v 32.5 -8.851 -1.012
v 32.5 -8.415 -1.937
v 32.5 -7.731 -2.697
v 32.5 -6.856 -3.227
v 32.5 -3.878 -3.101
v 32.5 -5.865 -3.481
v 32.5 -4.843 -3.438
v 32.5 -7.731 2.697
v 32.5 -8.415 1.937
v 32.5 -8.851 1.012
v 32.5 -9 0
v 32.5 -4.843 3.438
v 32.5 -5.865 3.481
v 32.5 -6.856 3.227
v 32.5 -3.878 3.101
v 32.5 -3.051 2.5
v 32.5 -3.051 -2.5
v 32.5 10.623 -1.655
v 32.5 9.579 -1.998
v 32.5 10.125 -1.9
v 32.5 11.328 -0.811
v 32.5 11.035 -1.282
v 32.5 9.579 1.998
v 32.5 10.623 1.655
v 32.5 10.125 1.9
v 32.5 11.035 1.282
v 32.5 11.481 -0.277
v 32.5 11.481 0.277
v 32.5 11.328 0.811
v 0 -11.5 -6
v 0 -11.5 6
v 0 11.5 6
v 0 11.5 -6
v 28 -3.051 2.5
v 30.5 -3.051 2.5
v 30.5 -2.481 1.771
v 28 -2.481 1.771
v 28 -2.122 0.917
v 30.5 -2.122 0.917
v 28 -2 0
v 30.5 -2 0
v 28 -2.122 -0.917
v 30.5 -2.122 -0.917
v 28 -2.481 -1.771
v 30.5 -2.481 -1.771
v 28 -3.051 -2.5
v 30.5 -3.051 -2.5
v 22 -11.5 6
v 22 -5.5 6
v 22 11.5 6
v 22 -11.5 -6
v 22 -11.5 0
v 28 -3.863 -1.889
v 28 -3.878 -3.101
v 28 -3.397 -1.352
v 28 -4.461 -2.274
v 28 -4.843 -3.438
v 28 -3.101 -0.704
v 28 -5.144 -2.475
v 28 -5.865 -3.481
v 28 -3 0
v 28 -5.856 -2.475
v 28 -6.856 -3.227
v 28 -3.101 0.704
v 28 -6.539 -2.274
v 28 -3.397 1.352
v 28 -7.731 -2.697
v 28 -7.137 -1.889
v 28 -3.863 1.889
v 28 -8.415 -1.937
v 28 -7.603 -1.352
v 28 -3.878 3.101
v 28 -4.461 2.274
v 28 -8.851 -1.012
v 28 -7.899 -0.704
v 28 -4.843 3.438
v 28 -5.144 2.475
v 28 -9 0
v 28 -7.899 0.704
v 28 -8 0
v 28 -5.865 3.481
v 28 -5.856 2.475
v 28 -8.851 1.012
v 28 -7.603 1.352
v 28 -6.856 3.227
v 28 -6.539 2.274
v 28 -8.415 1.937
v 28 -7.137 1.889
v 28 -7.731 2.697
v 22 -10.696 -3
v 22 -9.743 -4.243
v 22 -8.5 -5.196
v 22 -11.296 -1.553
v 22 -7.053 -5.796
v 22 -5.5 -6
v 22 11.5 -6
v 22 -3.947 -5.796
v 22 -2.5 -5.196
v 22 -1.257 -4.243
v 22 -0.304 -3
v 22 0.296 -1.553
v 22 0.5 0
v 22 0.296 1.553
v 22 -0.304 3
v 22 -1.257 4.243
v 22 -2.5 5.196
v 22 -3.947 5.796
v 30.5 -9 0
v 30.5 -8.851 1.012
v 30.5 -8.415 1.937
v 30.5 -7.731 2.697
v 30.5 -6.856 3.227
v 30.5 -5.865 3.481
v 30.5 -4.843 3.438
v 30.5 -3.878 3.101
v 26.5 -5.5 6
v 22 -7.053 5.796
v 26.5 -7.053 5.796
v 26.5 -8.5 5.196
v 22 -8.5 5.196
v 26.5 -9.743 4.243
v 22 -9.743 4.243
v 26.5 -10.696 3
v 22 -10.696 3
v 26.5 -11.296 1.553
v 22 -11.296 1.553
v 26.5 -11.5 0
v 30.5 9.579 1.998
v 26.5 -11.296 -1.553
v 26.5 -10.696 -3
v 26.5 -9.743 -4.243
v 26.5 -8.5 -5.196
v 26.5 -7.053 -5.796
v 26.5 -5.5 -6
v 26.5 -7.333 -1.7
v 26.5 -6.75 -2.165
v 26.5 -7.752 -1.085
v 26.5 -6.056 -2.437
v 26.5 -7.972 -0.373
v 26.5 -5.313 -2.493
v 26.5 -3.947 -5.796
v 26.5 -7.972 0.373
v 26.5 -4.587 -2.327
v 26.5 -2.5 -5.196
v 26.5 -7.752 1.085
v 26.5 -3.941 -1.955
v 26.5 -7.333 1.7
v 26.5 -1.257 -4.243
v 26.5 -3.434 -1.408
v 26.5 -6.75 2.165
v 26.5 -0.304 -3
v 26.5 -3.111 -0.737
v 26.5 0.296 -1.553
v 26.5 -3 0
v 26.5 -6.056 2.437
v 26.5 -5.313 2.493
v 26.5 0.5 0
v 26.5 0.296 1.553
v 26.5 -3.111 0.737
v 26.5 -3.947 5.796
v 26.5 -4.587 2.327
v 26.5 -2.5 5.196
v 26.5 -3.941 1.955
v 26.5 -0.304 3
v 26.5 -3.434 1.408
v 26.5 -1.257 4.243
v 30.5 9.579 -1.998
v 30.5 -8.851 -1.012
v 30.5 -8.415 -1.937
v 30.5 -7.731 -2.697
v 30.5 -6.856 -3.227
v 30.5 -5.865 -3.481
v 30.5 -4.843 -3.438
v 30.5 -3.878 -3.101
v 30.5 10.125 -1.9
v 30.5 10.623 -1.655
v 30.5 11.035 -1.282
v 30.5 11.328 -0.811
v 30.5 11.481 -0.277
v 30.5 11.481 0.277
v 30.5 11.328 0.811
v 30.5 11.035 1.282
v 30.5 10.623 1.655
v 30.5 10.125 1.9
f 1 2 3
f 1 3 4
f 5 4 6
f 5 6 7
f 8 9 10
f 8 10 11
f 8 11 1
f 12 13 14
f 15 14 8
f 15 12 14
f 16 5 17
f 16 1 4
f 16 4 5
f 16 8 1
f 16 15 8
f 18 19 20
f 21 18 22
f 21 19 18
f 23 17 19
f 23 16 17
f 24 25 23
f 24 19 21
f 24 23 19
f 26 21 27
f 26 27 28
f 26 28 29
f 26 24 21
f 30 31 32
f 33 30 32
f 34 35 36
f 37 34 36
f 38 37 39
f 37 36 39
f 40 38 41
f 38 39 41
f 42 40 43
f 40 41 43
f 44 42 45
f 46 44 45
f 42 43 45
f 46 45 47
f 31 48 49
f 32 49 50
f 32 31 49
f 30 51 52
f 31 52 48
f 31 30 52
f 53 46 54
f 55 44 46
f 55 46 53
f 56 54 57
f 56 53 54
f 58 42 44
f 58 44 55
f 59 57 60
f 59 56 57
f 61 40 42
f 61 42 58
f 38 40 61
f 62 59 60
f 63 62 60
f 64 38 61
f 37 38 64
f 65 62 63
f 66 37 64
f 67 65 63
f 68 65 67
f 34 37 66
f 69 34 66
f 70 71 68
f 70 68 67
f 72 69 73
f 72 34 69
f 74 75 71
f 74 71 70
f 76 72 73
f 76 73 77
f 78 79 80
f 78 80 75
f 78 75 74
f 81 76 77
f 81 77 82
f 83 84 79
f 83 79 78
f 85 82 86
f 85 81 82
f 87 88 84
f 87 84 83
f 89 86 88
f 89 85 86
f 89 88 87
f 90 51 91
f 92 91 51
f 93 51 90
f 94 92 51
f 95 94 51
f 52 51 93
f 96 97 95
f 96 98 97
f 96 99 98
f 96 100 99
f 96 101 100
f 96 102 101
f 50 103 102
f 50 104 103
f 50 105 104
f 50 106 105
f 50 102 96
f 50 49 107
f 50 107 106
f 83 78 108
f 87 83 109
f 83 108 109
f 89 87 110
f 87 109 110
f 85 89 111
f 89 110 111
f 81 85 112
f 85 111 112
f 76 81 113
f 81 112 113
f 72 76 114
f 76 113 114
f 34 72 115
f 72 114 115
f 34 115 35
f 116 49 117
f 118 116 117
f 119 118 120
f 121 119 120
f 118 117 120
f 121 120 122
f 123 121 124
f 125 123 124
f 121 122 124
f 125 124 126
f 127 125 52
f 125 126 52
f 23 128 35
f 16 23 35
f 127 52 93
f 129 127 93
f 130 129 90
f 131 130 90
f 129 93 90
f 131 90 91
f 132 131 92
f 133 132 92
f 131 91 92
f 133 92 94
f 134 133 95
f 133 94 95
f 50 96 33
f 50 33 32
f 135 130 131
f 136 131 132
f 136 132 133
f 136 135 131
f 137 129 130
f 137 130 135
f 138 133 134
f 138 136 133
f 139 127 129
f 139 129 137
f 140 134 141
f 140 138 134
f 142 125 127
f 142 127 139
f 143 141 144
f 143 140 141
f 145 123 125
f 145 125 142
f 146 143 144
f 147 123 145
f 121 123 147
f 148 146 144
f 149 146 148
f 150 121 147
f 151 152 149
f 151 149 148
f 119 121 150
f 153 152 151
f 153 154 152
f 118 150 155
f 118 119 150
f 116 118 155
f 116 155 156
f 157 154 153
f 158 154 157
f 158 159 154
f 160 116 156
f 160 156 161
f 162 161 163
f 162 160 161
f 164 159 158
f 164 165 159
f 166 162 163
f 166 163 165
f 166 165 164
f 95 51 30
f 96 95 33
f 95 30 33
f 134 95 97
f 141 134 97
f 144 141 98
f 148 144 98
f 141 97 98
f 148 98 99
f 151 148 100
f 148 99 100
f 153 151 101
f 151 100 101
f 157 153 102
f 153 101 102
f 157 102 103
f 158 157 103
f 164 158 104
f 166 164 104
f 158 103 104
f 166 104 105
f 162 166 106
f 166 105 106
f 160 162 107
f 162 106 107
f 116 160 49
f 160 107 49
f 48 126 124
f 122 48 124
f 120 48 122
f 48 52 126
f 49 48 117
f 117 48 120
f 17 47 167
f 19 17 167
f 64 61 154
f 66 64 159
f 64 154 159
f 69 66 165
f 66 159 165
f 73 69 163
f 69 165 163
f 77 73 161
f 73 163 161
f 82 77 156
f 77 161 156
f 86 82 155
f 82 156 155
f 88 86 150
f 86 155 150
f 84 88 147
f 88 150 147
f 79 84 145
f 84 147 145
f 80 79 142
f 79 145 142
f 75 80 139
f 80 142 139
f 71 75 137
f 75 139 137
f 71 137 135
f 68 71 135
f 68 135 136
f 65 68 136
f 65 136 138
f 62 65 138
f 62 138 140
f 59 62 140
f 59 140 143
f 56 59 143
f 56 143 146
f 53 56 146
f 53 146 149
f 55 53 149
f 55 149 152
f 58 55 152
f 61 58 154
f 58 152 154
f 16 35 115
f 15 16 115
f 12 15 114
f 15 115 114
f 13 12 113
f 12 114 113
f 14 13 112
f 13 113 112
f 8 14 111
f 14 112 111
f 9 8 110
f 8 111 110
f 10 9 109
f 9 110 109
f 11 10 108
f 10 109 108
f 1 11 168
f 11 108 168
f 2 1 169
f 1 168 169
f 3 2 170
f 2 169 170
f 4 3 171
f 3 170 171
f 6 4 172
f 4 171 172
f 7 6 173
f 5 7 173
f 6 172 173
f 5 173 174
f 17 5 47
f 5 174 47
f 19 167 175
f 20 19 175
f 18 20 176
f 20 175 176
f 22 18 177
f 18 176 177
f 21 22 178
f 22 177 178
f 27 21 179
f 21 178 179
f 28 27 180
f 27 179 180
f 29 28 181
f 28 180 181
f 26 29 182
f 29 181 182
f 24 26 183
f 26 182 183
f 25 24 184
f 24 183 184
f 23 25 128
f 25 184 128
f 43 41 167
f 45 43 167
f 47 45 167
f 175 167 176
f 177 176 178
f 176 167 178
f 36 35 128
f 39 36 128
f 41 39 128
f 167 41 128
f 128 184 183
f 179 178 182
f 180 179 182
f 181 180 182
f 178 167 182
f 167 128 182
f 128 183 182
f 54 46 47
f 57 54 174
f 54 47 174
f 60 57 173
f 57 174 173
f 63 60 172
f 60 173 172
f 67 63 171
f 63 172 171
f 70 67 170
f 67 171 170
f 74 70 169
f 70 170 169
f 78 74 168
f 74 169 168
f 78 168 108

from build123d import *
from build123d import SkipClean  # not in build123d's __all__

# Parameters (mm, degrees)
F0_W     = 23
F0_H     = 12
F1_DEPTH = 22
F3_DEPTH = 4.5
F4_R     = 2.5
F5_DEPTH = 4
F6_R     = 2.5
F7_DEPTH = 2
F8_R     = 2.5
F9_DEPTH = 2.5


with BuildPart() as f1:
    # F0 (on Right) → F1 (new body)
    with BuildSketch(Plane.YZ):
        Rectangle(F0_W, F0_H)
    extrude(amount=F1_DEPTH)

    # F2 (on face) → F3 (join)
    with BuildSketch(Plane.YZ.offset(22)):
        with BuildLine():
            ThreePointArc((-5.5, -6), (-1.2573593129, -4.2426406871), (0.5, 0))
            ThreePointArc((0.5, 0), (-1.2573593129, 4.2426406871), (-5.5, 6))
            ThreePointArc((-5.5, 6), (-9.7426406871, 4.2426406871), (-11.5, 0))
            ThreePointArc((-11.5, 0), (-9.7426406871, -4.2426406871), (-5.5, -6))
        make_face()
    extrude(amount=F3_DEPTH)

    # F4 (on face) → F5 (join)
    with BuildSketch(Plane.YZ.offset(26.5)):
        with Locations((-5.5, 0)):
            Circle(F4_R)
    extrude(amount=F5_DEPTH)

    # F6 (on face) → F7 (join)
    with BuildSketch(Plane.YZ.offset(30.5)):
        with BuildLine():
            Line((-3.0505102572, -2.5), (9.5793642451, -1.9984247088))
            ThreePointArc((9.5793642451, -1.9984247088), (11.5, 0), (9.5793642451, 1.9984247088))
            Line((9.5793642451, 1.9984247088), (-3.0505102572, 2.5))
            ThreePointArc((-3.0505102572, 2.5), (-9, 0), (-3.0505102572, -2.5))
        make_face()
        with Locations((-5.5, 0)):
            Circle(F6_R, mode=Mode.SUBTRACT)
        with Locations((-5.5, 0)):
            Circle(F6_R)
    extrude(amount=F7_DEPTH)

    # F8 (on face) → F9 (join)
    with BuildSketch(Plane(origin=(30.5, 0, 0), x_dir=(0, -1, 0), z_dir=(-1, 0, 0))):
        with BuildLine():
            ThreePointArc((3.0505102572, -2.5), (6.8558735008, -3.2267021942), (9, 0))
            ThreePointArc((9, 0), (6.8558735008, 3.2267021942), (3.0505102572, 2.5))
            ThreePointArc((3.0505102572, 2.5), (2, 0), (3.0505102572, -2.5))
        make_face()
        with Locations((5.5, 0)):
            Circle(F8_R, mode=Mode.SUBTRACT)
    with SkipClean():  # cleaning this boolean's faces spoils the solid; the shape is the same uncleaned
        extrude(amount=F9_DEPTH)


solid = f1.part
